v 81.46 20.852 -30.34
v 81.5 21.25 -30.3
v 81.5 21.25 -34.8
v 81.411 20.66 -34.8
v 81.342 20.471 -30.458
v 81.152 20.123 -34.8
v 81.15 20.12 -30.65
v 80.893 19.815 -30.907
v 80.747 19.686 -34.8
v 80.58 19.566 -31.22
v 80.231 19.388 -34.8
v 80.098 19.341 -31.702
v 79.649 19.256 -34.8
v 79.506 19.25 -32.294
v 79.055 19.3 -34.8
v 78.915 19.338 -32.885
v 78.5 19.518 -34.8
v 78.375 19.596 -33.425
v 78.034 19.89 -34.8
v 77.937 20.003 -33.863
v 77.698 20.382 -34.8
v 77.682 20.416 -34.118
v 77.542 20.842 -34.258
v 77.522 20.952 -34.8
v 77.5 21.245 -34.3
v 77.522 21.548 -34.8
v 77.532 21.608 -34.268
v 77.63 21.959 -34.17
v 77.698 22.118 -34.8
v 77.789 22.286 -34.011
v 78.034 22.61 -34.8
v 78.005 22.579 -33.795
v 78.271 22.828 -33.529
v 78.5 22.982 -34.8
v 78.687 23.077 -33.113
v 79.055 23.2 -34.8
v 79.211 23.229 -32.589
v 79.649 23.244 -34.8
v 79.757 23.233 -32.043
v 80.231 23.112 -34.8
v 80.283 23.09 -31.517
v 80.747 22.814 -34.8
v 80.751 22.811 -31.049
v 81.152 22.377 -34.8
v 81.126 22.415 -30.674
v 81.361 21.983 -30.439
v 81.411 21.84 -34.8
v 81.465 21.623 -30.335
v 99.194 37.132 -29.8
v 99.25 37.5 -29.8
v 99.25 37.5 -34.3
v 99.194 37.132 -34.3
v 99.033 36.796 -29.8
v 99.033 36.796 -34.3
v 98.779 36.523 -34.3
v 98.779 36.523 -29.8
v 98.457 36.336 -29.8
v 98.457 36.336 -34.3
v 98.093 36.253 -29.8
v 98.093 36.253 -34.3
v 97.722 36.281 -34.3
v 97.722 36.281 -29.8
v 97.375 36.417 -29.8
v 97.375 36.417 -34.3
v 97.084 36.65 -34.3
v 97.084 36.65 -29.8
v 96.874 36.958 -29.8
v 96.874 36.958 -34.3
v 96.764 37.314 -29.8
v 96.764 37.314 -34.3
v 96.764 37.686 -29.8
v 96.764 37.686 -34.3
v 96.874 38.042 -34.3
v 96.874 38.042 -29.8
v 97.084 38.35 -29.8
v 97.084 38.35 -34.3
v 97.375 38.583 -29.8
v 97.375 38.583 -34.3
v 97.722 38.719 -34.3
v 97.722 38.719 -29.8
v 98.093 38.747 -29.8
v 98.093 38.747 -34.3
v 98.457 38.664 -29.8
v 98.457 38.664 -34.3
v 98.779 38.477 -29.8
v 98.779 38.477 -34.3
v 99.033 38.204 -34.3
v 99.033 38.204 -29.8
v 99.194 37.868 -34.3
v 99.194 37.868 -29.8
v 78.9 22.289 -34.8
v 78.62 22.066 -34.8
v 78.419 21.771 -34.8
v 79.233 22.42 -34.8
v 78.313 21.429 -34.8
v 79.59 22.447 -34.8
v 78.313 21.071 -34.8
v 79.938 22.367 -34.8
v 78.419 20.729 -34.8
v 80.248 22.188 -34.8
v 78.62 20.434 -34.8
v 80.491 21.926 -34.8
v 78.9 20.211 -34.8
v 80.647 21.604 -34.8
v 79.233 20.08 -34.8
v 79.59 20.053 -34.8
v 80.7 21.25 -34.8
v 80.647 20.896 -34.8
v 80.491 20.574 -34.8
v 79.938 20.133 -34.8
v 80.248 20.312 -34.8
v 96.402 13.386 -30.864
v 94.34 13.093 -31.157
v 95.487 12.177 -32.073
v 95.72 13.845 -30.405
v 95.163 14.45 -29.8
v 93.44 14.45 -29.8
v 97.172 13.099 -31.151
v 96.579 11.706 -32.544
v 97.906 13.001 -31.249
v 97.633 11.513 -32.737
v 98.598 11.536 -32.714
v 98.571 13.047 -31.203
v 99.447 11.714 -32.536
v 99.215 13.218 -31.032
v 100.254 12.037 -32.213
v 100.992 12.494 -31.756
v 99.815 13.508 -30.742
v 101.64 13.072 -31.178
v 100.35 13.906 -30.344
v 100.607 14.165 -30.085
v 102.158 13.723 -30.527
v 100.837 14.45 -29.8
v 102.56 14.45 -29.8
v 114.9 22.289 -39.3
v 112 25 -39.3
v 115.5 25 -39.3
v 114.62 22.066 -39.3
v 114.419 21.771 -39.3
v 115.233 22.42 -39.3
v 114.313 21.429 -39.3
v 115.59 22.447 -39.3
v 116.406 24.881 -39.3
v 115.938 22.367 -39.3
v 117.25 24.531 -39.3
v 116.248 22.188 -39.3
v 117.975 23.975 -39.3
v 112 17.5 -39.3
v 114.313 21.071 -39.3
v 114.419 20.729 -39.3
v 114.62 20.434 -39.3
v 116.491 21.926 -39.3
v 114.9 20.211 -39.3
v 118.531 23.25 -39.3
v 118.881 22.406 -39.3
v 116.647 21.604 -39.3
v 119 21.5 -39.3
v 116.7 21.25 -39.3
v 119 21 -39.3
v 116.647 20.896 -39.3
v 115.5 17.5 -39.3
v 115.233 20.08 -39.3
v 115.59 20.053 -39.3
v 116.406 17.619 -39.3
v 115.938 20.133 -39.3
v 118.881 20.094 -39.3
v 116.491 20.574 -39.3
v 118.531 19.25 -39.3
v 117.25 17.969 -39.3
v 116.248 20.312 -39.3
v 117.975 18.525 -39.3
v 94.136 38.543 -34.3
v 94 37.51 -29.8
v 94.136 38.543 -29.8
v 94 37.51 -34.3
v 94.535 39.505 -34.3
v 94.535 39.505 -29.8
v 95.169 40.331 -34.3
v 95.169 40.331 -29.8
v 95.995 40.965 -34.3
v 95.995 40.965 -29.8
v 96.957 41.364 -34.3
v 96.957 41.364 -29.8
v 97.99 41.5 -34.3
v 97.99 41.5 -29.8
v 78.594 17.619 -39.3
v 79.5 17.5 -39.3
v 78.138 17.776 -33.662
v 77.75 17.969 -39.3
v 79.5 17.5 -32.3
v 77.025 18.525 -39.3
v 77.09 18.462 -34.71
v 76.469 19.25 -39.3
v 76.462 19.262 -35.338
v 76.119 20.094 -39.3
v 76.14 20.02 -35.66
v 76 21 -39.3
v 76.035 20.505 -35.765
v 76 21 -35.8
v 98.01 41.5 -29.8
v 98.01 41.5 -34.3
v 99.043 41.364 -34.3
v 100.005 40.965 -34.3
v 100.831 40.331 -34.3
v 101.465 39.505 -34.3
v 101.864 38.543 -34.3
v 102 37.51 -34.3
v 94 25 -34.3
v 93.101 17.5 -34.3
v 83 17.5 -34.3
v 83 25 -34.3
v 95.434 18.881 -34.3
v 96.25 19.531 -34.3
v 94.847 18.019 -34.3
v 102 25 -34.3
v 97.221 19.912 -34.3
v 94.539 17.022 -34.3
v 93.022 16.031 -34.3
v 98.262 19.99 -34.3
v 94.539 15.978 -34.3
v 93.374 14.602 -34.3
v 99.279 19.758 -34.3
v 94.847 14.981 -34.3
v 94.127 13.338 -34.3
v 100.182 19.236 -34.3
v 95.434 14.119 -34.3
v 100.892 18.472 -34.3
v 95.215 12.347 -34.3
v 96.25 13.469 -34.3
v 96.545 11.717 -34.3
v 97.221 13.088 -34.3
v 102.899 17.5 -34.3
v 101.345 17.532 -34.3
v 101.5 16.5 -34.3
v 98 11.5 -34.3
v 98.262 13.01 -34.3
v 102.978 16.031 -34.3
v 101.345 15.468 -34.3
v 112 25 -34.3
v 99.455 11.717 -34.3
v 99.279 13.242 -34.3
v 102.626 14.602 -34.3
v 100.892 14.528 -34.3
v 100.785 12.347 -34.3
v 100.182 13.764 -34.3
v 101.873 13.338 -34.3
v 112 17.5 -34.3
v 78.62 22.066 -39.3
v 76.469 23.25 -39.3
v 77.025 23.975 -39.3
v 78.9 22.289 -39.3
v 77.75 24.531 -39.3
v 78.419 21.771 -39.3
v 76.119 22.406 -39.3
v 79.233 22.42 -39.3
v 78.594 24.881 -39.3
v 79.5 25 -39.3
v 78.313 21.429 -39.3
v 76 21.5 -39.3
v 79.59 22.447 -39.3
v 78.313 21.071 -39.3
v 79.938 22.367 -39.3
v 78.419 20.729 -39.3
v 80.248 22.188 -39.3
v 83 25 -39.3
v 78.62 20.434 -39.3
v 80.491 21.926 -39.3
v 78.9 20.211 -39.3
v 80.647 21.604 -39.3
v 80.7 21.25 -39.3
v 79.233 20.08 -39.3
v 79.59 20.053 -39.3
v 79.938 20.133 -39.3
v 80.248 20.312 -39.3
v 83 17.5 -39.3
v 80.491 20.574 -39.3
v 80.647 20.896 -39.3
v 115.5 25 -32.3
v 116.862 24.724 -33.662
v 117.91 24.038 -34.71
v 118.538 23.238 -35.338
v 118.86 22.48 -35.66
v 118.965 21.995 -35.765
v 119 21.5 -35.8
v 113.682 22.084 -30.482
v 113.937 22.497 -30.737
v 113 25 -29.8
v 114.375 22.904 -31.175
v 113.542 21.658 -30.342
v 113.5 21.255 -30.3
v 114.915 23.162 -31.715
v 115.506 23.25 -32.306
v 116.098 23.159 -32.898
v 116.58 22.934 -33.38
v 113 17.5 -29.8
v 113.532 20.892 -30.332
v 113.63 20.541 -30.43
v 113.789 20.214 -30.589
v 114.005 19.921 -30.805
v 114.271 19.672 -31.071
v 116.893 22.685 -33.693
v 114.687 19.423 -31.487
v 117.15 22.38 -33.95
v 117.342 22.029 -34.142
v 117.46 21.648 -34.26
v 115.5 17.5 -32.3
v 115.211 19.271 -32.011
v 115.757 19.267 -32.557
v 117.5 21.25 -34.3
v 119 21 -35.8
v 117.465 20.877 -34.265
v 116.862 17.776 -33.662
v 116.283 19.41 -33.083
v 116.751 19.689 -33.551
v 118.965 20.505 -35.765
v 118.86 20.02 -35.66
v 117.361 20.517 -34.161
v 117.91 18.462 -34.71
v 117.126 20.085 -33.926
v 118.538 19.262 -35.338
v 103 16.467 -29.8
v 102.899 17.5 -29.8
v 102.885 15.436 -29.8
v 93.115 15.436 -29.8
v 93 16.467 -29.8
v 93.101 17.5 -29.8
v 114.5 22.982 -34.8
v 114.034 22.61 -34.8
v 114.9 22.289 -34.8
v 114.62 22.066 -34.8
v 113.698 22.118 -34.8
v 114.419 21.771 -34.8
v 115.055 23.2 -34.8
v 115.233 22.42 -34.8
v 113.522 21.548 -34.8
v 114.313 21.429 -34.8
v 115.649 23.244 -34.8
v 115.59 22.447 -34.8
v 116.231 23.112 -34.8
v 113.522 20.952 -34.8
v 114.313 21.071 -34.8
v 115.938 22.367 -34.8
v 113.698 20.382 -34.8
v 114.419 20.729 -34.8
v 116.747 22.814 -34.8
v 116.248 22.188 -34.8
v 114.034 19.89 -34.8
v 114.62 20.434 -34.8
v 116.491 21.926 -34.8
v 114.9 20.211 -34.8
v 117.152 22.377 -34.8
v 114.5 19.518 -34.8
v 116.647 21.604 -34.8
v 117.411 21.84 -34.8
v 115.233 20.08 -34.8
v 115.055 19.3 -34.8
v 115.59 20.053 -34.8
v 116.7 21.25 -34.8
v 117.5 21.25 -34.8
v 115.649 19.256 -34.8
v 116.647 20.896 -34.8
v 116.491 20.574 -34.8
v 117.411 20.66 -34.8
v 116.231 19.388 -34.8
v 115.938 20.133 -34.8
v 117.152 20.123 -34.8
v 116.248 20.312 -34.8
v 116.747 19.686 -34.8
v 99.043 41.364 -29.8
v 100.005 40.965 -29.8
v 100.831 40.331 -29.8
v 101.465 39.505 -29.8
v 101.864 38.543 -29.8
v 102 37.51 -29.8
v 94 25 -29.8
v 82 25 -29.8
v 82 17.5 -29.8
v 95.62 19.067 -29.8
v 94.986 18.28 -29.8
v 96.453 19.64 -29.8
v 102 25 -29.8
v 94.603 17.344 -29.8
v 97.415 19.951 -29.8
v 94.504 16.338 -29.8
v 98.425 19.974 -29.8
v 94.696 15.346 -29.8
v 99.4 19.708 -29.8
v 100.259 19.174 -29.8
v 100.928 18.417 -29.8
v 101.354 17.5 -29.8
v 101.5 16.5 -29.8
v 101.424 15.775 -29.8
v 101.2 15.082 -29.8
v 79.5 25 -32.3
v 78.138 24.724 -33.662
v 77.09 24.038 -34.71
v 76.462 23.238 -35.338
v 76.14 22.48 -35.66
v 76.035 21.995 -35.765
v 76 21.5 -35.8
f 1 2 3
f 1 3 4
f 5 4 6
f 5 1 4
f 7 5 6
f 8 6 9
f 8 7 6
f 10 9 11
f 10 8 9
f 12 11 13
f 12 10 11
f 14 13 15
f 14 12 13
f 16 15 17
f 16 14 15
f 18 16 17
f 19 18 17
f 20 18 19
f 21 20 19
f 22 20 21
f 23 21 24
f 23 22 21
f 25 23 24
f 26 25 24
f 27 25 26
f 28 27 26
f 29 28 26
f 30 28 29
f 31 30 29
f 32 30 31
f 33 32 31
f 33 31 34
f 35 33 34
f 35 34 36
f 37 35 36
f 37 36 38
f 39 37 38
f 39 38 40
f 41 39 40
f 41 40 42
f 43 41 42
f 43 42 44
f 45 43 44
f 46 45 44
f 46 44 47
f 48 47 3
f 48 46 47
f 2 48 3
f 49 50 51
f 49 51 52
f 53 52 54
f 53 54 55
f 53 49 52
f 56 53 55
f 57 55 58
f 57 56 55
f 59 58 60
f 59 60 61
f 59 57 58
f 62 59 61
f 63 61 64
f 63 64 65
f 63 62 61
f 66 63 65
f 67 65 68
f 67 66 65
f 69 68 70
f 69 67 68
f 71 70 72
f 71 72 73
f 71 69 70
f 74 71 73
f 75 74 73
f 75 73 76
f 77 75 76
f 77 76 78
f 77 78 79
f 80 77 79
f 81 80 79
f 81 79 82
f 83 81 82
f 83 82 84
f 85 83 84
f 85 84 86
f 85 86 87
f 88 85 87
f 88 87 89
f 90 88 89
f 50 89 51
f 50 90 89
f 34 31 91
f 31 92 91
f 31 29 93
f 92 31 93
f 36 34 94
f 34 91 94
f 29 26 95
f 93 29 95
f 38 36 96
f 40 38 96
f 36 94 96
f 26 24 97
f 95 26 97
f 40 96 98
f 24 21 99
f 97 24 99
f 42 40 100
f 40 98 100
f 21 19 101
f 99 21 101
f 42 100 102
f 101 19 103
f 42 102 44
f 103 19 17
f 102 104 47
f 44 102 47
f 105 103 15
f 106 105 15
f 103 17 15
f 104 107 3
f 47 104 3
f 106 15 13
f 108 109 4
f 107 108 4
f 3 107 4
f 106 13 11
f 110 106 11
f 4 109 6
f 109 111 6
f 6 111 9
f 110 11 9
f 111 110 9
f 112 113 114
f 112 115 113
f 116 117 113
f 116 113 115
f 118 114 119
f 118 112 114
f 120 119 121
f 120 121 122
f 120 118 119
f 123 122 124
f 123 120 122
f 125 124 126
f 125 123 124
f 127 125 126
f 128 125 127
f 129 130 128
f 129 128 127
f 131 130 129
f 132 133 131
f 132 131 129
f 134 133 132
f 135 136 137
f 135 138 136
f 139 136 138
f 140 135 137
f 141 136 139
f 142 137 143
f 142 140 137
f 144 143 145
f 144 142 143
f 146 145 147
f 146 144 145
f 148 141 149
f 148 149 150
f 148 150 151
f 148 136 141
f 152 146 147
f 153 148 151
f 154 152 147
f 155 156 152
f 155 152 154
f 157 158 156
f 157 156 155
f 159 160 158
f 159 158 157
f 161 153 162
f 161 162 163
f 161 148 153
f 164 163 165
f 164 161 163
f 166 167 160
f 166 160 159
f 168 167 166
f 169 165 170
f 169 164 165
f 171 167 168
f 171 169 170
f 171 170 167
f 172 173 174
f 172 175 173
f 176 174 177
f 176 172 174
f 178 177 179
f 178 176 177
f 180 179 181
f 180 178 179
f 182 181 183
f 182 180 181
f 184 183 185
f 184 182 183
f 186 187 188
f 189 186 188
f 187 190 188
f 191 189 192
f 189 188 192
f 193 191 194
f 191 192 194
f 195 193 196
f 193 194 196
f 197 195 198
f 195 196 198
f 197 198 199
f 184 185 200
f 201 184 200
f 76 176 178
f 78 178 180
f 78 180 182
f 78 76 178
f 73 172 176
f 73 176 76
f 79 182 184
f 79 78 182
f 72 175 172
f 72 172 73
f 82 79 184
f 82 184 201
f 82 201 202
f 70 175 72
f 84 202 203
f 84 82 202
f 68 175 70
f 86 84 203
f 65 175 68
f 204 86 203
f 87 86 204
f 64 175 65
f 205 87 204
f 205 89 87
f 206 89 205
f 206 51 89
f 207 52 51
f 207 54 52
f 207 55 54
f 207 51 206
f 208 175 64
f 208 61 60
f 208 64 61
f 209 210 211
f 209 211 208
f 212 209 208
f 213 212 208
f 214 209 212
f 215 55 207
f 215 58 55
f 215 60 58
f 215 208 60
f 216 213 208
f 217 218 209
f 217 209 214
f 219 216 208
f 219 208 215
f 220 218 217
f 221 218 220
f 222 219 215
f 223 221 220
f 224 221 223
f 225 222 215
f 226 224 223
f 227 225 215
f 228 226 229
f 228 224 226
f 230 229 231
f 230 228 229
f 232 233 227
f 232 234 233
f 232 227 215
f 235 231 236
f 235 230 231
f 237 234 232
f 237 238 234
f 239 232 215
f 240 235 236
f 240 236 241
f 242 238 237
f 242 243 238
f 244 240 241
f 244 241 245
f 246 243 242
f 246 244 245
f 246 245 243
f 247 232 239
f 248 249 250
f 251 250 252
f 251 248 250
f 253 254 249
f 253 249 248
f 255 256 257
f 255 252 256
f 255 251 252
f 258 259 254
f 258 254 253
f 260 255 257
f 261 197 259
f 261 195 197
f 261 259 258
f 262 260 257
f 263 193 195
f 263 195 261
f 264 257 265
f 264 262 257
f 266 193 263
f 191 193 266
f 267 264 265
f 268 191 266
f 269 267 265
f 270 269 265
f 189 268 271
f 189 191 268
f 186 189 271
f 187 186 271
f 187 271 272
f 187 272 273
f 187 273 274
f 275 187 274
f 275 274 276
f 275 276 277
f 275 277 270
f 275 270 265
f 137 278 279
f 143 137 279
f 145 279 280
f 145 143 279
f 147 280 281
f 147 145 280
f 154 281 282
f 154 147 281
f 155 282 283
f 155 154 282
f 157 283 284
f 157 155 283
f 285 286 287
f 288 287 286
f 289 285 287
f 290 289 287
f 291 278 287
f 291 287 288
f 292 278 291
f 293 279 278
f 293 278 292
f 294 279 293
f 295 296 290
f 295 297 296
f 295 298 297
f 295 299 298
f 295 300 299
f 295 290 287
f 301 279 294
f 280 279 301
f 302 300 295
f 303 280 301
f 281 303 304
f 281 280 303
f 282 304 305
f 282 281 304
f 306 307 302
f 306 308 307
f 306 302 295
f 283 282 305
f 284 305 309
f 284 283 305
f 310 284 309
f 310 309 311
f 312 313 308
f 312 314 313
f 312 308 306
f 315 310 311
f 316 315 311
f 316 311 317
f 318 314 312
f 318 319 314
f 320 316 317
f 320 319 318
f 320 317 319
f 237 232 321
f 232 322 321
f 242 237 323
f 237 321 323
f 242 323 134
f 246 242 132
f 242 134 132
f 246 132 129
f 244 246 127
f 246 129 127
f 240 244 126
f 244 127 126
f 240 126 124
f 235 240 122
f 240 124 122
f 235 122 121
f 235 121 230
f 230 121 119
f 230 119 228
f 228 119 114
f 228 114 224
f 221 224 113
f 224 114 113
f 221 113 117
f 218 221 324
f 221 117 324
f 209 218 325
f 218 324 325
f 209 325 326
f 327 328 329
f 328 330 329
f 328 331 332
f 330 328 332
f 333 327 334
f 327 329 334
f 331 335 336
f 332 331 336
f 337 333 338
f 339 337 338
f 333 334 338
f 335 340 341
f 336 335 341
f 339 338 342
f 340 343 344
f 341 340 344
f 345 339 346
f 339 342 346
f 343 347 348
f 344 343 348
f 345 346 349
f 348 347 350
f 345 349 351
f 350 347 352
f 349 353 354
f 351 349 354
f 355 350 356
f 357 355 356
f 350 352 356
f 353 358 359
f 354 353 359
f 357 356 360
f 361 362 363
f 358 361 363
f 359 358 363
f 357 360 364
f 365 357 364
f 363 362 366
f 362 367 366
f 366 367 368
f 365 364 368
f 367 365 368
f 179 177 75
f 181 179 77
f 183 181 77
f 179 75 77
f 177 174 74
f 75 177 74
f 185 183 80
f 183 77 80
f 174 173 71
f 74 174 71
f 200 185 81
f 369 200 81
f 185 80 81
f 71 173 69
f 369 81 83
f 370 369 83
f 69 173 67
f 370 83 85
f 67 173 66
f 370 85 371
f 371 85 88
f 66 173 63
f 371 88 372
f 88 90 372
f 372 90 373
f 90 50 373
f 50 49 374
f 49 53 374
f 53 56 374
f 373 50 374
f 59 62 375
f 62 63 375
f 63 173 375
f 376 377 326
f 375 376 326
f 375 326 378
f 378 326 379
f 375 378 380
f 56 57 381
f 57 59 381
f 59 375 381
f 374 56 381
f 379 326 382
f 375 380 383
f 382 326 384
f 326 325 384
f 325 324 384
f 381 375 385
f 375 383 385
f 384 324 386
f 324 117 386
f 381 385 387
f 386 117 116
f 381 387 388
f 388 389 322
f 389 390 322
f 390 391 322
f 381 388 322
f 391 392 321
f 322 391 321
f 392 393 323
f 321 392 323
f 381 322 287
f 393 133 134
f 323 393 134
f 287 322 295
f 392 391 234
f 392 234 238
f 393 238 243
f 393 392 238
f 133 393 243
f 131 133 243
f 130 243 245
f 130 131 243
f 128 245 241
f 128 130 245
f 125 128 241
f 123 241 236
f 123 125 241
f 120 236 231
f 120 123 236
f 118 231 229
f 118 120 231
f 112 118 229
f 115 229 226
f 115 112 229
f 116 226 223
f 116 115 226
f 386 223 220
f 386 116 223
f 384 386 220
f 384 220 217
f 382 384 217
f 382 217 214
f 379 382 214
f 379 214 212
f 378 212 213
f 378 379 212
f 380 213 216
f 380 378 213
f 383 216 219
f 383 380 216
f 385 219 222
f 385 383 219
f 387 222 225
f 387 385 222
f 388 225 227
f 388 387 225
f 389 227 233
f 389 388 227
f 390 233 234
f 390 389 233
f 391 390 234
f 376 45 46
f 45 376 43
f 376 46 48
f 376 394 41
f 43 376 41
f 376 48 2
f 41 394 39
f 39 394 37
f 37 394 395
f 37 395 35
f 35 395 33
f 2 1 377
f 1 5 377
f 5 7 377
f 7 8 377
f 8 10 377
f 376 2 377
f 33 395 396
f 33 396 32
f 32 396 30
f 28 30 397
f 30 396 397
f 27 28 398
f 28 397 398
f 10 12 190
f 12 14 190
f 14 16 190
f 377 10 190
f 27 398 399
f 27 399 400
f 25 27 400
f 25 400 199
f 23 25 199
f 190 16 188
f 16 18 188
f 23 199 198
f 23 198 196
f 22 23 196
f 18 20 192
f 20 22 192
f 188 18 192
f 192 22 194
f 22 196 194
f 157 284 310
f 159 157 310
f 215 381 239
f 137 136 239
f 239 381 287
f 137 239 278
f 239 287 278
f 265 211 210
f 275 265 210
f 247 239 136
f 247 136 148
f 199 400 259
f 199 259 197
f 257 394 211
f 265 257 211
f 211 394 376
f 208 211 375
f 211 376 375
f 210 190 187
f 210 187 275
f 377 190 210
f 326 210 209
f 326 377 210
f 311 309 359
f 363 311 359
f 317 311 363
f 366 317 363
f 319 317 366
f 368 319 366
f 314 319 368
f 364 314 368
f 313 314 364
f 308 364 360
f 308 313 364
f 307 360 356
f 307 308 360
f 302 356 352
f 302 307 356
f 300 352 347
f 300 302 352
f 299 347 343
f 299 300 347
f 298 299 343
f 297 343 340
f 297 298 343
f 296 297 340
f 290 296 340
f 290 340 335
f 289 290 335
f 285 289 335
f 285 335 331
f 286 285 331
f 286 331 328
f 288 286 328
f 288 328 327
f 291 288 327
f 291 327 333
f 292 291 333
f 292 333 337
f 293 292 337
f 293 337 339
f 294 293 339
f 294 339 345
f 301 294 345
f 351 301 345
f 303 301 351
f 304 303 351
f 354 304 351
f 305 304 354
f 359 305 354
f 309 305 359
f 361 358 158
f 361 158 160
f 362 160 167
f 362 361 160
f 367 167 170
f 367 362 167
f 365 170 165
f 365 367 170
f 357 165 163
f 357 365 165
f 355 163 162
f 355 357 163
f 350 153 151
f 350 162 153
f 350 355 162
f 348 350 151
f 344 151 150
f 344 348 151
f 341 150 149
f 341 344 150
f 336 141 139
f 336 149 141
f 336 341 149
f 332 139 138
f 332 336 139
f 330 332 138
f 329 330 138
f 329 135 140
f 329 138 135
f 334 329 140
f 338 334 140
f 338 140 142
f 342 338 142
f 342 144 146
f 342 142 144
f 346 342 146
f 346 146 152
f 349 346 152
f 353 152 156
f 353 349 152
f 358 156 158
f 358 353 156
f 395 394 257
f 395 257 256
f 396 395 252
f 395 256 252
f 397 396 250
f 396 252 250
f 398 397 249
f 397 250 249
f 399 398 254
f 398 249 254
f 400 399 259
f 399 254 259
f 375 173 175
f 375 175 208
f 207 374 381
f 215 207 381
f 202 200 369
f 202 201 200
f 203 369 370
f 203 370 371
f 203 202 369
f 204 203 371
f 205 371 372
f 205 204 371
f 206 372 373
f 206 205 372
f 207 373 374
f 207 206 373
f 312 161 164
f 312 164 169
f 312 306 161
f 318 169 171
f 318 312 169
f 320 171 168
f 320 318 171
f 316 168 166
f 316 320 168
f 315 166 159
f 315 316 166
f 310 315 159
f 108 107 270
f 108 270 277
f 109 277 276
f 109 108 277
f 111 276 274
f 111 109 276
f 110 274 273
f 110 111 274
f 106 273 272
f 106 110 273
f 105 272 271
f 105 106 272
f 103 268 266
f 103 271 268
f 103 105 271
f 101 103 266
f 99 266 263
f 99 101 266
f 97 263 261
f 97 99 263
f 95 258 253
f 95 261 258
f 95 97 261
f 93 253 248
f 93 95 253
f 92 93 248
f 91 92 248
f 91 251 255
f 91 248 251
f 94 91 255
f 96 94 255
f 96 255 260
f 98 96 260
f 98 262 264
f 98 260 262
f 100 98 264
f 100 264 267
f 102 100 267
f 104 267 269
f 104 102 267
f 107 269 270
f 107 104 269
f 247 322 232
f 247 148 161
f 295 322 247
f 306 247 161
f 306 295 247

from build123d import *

# Parameters (mm, degrees)
BOX548_W               = 15
BOX548_H               = 13
BOX548_DEPTH           = 4.5
BOX548_ROLL_ANGLE      = 45
CYLINDER061_R          = 1.2
CYLINDER061_DEPTH      = 20
CYLINDER064_R          = 2
CYLINDER064_DEPTH      = 5
CYLINDER063_R          = 2
CYLINDER063_DEPTH      = 5
CYLINDER060_R          = 1.2
CYLINDER060_DEPTH      = 20
CYLINDER059_R          = 1.25
CYLINDER059_DEPTH      = 4.5
CYLINDER052_R          = 3.5
CYLINDER052_DEPTH      = 4.5
BOX043_W               = 7
BOX043_H               = 7.5
BOX043_DEPTH           = 5
BOX044_W               = 7
BOX044_H               = 7.5
BOX044_DEPTH           = 5
BOX041_W               = 8
BOX041_H               = 25
BOX041_DEPTH           = 4.5
CYLINDER053_R          = 5
CYLINDER053_DEPTH      = 4.5
FILLET011_R            = 3.99
BOX042_W               = 43
BOX042_H               = 7.5
BOX042_DEPTH           = 4.5
CHAMFER003_SIZE        = 6
FILLET012_R            = 3.5
CUT073_PLACEMENT_ANGLE = 180


with BuildPart() as cube739:
    # Box548 → Box548 (new body)
    with BuildSketch(Plane.XY):
        with Locations((7.5, 6.5)):
            Rectangle(BOX548_W, BOX548_H)
    extrude(amount=BOX548_DEPTH)


with BuildPart() as cube739_1:
    # Box548 roll: moved
    add(cube739.part.rotate(Axis((0, 0, 0), (1, 0, 0)), BOX548_ROLL_ANGLE))


with BuildPart() as cube739_2:
    # Box548 placement: moved
    add(cube739_1.part.moved(Location((90, 10, -34.25))))


with BuildPart() as cylinder061:
    # Cylinder061 → Cylinder061 (new body)
    with BuildSketch(Plane(origin=(-18.5, -4.75, -9.7), x_dir=(1, 0, 0), z_dir=(0, 0, 1))):
        Circle(CYLINDER061_R)
    extrude(amount=CYLINDER061_DEPTH)


with BuildPart() as fusion040:
    # Cylinder064 → Cylinder064 (new body)
    with BuildSketch(Plane(origin=(-18.5, -4.75, -9.2), x_dir=(1, 0, 0), z_dir=(0, 0, 1))):
        Circle(CYLINDER064_R)
    extrude(amount=CYLINDER064_DEPTH)

    # Fusion040: union Cylinder061
    add(cylinder061.part)


with BuildPart() as cylinder063:
    # Cylinder063 → Cylinder063 (new body)
    with BuildSketch(Plane(origin=(17.5, -4.75, -9.2), x_dir=(1, 0, 0), z_dir=(0, 0, 1))):
        Circle(CYLINDER063_R)
    extrude(amount=CYLINDER063_DEPTH)


with BuildPart() as fusion041:
    # Cylinder060 → Cylinder060 (new body)
    with BuildSketch(Plane(origin=(17.5, -4.75, -9.7), x_dir=(1, 0, 0), z_dir=(0, 0, 1))):
        Circle(CYLINDER060_R)
    extrude(amount=CYLINDER060_DEPTH)

    # Fusion039: union Cylinder063
    add(cylinder063.part)

    # Fusion041: union Fusion040
    add(fusion040.part)


with BuildPart() as cylinder059:
    # Cylinder059 → Cylinder059 (new body)
    with BuildSketch(Plane(origin=(0, -21, -9.2), x_dir=(1, 0, 0), z_dir=(0, 0, 1))):
        Circle(CYLINDER059_R)
    extrude(amount=CYLINDER059_DEPTH)


with BuildPart() as cylinder052:
    # Cylinder052 → Cylinder052 (new body)
    with BuildSketch(Plane.XY.offset(-9.2)):
        Circle(CYLINDER052_R)
    extrude(amount=CYLINDER052_DEPTH)


with BuildPart() as cube003:
    # Box043 → Box043 (new body)
    with BuildSketch(Plane(origin=(-22, -8.5, -4.7), x_dir=(1, 0, 0), z_dir=(0, 0, 1))):
        with Locations((3.5, 3.75)):
            Rectangle(BOX043_W, BOX043_H)
    extrude(amount=BOX043_DEPTH)


with BuildPart() as cube004:
    # Box044 → Box044 (new body)
    with BuildSketch(Plane(origin=(14, -8.5, -4.7), x_dir=(1, 0, 0), z_dir=(0, 0, 1))):
        with Locations((3.5, 3.75)):
            Rectangle(BOX044_W, BOX044_H)
    extrude(amount=BOX044_DEPTH)


with BuildPart() as cube001:
    # Box041 → Box041 (new body)
    with BuildSketch(Plane(origin=(-4, -25, -9.2), x_dir=(1, 0, 0), z_dir=(0, 0, 1))):
        with Locations((4, 12.5)):
            Rectangle(BOX041_W, BOX041_H)
    extrude(amount=BOX041_DEPTH)


with BuildPart() as fillet011:
    # Cylinder053 → Cylinder053 (new body)
    with BuildSketch(Plane.XY.offset(-9.2)):
        Circle(CYLINDER053_R)
    extrude(amount=CYLINDER053_DEPTH)

    # Fusion034: union Cube001
    add(cube001.part)

    # Fillet011
    fillet011_edges = [fillet011.edges().sort_by_distance(p)[0] for p in [
        (4, -25, -6.95),
        (-4, -25, -6.95),
    ]]
    fillet(fillet011_edges, radius=FILLET011_R)


with BuildPart() as front_axle_steering_knukle_arm_upper:
    # Box042 → Box042 (new body)
    with BuildSketch(Plane(origin=(-22, -8.5, -9.2), x_dir=(1, 0, 0), z_dir=(0, 0, 1))):
        with Locations((21.5, 3.75)):
            Rectangle(BOX042_W, BOX042_H)
    extrude(amount=BOX042_DEPTH)

    # Fusion036: union Cube003, Cube004, Fillet011
    add(cube003.part)
    add(cube004.part)
    add(fillet011.part)

    # Cut066: cut Cylinder052
    add(cylinder052.part, mode=Mode.SUBTRACT)

    # Chamfer003
    chamfer003_edges = [front_axle_steering_knukle_arm_upper.edges().sort_by_distance(p)[0] for p in [
        (21, -4.75, -9.2),
        (-22, -4.75, -9.2),
    ]]
    chamfer(chamfer003_edges, length=CHAMFER003_SIZE)

    # Fillet012
    fillet012_edges = [front_axle_steering_knukle_arm_upper.edges().sort_by_distance(p)[0] for p in [
        (-22, -8.5, -1.45),
        (-22, -1, -1.45),
        (21, -1, -1.45),
        (21, -8.5, -1.45),
    ]]
    fillet(fillet012_edges, radius=FILLET012_R)

    # Cut067: cut Cylinder059
    add(cylinder059.part, mode=Mode.SUBTRACT)

    # Cut073: cut Fusion041
    add(fusion041.part, mode=Mode.SUBTRACT)


with BuildPart() as front_axle_steering_knukle_arm_upper_1:
    # Cut073 placement: moved
    add(front_axle_steering_knukle_arm_upper.part.moved(Location((98, 16.5, -39))).rotate(Axis((98, 16.5, -39), (1, 0, 0)), CUT073_PLACEMENT_ANGLE))

    # Cut670: cut Cube739
    add(cube739_2.part, mode=Mode.SUBTRACT)


solid = front_axle_steering_knukle_arm_upper_1.part
